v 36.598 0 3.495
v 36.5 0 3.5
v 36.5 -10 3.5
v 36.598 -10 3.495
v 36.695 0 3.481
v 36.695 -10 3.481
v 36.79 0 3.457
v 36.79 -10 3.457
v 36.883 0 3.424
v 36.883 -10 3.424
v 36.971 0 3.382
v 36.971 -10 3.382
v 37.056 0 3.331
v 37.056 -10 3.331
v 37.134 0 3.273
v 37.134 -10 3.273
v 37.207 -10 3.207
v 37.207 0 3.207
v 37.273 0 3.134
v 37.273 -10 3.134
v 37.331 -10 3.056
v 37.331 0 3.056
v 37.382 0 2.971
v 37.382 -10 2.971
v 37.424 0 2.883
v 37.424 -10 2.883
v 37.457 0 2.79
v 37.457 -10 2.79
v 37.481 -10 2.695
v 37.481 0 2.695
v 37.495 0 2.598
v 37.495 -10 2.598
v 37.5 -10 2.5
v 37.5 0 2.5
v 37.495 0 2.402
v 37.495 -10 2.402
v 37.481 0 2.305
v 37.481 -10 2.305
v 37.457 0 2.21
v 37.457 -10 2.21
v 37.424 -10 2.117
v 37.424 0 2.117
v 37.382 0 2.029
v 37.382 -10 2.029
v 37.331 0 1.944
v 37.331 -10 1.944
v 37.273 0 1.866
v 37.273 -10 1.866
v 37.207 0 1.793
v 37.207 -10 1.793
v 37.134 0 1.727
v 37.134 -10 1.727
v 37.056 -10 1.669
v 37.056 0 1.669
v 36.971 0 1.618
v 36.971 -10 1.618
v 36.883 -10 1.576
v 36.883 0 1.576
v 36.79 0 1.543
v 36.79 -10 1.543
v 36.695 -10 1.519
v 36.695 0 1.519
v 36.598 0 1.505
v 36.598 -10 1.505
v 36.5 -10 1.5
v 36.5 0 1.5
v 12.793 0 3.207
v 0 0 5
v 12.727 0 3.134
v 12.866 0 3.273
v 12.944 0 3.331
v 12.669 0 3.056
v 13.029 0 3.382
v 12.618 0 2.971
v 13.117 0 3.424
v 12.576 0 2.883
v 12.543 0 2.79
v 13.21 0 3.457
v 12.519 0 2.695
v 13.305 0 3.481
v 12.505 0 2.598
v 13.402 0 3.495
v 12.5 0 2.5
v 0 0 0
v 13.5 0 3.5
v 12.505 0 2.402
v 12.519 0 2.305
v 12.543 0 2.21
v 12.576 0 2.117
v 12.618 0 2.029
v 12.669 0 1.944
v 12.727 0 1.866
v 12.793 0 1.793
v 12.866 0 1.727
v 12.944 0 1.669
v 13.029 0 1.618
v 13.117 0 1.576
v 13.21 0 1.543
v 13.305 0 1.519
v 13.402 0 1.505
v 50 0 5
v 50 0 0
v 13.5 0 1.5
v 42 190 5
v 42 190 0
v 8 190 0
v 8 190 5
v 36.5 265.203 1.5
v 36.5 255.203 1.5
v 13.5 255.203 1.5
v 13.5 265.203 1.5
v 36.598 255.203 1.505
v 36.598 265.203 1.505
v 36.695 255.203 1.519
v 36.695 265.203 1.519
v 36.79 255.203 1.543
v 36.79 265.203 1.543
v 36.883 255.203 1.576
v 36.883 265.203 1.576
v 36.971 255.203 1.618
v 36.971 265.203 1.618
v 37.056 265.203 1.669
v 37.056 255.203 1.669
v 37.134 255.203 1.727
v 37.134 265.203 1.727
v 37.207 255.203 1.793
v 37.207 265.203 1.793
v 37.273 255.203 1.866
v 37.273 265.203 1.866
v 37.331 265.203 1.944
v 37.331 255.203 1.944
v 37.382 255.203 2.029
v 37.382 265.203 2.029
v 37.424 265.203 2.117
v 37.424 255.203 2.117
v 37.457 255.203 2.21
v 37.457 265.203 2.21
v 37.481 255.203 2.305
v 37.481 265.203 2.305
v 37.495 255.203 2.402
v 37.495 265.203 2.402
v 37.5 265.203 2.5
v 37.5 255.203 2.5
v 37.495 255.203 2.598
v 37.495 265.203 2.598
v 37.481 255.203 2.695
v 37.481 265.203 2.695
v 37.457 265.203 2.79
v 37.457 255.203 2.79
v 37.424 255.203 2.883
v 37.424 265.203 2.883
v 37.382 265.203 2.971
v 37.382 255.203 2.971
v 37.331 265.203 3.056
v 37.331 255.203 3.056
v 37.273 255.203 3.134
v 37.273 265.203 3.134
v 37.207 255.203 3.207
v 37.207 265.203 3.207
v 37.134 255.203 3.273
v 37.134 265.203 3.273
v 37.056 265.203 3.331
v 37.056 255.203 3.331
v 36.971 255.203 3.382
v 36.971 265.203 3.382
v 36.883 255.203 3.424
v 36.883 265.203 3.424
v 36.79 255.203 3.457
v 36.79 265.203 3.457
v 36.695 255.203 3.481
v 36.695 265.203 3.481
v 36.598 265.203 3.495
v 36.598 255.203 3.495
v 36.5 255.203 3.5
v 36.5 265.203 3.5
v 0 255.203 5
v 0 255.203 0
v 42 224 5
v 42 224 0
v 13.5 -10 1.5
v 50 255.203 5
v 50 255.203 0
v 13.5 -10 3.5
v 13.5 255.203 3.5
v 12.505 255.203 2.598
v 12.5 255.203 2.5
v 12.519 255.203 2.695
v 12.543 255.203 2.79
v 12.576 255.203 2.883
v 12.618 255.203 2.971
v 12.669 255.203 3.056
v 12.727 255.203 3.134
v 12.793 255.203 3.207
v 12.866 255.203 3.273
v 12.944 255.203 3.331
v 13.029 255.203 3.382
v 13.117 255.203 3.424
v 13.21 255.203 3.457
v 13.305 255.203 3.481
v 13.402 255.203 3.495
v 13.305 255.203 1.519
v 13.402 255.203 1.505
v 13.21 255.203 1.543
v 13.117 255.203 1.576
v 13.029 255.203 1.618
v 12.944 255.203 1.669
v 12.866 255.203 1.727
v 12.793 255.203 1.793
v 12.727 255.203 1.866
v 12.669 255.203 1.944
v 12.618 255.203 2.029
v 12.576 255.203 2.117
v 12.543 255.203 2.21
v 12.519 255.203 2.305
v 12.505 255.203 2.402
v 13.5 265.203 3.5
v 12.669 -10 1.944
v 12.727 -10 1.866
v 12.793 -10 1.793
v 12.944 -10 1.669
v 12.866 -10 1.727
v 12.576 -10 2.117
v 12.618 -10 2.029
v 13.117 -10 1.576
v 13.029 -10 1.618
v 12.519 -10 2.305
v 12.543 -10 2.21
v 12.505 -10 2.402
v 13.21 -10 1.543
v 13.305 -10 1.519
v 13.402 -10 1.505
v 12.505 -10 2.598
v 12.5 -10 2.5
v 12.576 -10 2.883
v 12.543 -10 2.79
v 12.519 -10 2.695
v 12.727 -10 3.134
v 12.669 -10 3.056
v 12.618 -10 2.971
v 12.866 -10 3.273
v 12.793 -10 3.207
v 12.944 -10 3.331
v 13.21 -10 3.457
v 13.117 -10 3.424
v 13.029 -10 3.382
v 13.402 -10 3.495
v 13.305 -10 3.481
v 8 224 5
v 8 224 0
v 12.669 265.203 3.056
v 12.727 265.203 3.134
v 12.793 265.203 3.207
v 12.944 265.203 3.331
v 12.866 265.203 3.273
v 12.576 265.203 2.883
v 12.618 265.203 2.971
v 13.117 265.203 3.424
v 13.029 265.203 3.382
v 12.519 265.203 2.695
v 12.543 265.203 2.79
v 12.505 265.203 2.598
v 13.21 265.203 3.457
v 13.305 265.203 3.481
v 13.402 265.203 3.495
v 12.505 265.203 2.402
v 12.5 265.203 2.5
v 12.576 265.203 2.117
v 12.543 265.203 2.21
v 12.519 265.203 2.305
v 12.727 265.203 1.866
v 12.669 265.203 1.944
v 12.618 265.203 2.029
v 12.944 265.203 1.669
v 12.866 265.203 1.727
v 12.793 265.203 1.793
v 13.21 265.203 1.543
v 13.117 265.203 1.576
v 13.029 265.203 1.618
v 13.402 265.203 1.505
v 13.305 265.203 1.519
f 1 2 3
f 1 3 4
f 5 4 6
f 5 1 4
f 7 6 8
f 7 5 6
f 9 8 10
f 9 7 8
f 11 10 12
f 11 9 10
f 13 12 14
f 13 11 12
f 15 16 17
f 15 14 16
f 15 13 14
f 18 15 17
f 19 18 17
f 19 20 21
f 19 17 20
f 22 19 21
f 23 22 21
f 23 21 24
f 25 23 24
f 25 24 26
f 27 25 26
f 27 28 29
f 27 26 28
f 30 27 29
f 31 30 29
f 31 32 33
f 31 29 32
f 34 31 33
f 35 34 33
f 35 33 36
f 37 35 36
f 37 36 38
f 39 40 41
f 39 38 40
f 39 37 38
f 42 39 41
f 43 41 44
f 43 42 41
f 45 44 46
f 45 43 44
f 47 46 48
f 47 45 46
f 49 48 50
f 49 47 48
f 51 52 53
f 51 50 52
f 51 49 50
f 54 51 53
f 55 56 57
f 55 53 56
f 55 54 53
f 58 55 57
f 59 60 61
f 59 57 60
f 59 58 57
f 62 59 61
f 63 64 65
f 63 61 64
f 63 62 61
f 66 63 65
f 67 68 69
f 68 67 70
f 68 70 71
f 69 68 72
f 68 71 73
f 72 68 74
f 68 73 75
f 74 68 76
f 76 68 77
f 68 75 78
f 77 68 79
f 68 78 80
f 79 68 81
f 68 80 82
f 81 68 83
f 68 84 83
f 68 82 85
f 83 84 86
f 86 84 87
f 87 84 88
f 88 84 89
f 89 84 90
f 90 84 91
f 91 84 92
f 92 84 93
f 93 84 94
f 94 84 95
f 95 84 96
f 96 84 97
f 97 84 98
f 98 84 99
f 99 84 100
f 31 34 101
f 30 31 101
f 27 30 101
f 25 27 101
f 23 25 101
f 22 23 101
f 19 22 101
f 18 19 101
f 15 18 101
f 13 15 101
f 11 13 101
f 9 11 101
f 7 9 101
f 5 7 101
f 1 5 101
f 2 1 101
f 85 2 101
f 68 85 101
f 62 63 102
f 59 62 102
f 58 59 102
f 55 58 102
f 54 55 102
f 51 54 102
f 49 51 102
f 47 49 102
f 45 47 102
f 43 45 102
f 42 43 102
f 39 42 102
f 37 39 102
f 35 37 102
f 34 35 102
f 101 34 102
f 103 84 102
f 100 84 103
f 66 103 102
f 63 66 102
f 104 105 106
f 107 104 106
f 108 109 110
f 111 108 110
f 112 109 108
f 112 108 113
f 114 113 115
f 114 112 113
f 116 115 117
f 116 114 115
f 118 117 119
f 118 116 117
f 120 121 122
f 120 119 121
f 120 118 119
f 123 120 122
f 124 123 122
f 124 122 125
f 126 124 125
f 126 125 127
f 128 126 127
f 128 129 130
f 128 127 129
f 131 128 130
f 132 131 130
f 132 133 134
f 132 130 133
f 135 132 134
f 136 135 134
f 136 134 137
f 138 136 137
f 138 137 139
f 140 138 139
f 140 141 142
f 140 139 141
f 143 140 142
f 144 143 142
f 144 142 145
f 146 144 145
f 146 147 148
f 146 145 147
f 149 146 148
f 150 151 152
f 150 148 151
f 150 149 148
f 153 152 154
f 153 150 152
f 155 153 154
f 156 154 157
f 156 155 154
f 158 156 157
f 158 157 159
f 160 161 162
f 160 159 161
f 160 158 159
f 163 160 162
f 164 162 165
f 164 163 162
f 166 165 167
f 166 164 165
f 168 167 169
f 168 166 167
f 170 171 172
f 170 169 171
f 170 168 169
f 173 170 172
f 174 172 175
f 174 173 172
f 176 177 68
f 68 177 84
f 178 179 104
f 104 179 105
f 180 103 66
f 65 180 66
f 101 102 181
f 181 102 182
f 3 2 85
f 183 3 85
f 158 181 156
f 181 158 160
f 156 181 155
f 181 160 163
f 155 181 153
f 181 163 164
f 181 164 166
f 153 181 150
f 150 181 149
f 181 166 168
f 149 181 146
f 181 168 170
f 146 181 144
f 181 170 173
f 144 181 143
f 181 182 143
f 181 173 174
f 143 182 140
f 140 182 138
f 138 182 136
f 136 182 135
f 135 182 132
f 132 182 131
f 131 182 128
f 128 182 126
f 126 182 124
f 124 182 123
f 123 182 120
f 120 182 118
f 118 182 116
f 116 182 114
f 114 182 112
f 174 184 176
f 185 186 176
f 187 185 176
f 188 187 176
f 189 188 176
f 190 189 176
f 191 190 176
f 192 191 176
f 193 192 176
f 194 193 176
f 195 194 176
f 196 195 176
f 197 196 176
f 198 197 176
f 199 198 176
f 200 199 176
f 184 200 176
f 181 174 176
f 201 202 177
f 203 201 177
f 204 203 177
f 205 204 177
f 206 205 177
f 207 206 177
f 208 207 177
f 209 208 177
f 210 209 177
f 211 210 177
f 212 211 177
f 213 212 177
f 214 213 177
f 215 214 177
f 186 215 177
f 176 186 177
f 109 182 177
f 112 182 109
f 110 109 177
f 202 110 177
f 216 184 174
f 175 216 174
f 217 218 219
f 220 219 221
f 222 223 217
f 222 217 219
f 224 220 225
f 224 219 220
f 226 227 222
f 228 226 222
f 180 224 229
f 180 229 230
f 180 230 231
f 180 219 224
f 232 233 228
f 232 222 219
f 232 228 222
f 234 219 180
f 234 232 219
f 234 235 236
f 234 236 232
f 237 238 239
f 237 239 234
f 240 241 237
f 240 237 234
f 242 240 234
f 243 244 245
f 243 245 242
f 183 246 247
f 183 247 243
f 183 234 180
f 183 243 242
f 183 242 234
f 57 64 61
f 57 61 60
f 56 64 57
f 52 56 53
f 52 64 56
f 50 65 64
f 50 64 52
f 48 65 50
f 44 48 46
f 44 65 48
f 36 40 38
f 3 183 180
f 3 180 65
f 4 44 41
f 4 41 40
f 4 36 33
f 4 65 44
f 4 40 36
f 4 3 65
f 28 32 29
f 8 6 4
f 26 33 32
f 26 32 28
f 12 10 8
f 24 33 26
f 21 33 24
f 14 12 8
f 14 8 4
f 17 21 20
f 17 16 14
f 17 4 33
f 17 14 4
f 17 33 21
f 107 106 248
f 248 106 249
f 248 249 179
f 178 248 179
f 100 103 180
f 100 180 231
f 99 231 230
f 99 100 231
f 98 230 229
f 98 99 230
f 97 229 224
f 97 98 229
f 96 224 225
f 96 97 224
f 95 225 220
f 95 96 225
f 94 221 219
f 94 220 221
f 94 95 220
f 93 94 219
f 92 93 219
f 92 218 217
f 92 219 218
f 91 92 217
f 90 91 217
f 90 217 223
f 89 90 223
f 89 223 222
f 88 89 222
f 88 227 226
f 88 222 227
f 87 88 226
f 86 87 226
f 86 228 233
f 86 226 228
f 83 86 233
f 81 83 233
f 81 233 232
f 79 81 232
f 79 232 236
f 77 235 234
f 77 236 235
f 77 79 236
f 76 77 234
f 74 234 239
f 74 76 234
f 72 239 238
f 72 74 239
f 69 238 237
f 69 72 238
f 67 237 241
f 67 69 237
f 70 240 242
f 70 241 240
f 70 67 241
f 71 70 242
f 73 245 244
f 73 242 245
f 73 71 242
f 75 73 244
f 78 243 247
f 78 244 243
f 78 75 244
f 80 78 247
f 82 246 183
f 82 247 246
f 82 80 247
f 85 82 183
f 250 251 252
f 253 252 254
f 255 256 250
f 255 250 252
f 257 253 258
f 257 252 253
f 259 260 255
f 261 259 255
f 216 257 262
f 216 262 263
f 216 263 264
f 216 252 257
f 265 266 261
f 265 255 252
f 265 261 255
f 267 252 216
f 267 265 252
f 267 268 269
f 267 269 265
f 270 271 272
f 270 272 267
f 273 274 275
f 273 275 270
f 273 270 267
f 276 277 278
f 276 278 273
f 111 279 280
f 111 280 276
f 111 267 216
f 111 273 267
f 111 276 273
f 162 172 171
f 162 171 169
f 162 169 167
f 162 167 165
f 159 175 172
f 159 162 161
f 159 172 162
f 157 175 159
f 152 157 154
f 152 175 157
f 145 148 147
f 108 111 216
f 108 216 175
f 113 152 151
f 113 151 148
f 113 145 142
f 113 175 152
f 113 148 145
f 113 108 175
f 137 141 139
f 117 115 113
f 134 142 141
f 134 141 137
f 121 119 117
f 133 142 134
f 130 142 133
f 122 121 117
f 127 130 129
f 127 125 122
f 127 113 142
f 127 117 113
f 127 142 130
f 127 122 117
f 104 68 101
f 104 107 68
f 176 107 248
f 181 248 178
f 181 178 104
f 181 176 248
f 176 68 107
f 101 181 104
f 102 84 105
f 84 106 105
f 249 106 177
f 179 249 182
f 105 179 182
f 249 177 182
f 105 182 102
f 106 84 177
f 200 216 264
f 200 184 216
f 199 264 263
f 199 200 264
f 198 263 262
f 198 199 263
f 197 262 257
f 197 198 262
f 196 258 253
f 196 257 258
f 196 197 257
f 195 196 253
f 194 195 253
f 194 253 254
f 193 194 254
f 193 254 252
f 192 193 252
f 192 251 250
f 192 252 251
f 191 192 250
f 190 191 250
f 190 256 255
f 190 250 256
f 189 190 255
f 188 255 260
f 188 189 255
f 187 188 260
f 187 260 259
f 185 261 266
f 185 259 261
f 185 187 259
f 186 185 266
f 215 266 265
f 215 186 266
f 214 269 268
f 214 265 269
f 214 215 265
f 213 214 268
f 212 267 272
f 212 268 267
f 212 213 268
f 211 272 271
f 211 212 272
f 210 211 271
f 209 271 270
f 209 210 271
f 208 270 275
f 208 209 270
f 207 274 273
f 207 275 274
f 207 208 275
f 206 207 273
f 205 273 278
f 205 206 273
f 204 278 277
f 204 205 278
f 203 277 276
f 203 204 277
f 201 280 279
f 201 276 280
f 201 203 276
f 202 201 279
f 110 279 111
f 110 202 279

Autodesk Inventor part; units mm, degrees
ref_plane "YZ Plane" through (0, 0, 0) normal (1, 0, 0) x (0, 1, 0)
ref_plane "XZ Plane" through (0, 0, 0) normal (0, 1, 0) x (-1, 0, 0)
ref_plane "XY Plane" through (0, 0, 0) normal (0, 0, 1) x (1, 0, 0)
sketch "Sketch1" plane through (0, 0, 0) normal (0, 0, 1) x (1, 0, 0)
  line L0 (0, 0) -> (50, 0)
  line L1 (50, 0) -> (50, 255.203)
  line L2 (50, 255.203) -> (0, 255.203)
  line L3 (0, 255.203) -> (0, 0)
  line L4 (8, 224) -> (42, 224)
  line L5 (42, 224) -> (42, 190)
  line L6 (42, 190) -> (8, 190)
  line L7 (8, 190) -> (8, 224)
  point P0 (25, 255.203)
  dimension "d0" = 50
  dimension "d1" = 255.203
  dimension "d8" = 34
  dimension "d9" = 34
  dimension "d10" = 8
  dimension "d12" = 190
extrude "Extrusion1" add sketch "Sketch1" along normal blind 5
sketch "Sketch2" plane through (0, 0, 0) normal (0, -1, 0) x (1, 0, 0)
  line L0 (13.5, 2.5) -> (36.5, 2.5) construction
  line L1 (13.5, 1.5) -> (36.5, 1.5)
  line L2 (36.5, 3.5) -> (13.5, 3.5)
  arc A0 (13.5, 3.5) -> (13.5, 1.5) centre (13.5, 2.5) ccw
  arc A1 (36.5, 1.5) -> (36.5, 3.5) centre (36.5, 2.5) ccw
  line L3 (0, 5) -> (50, 5) projected
  point P0 (0, 0)
  point P1 (25, 2.5)
  point P2 (37.5, 2.5)
  point P3 (12.5, 2.5)
  dimension "d13" = 2
  dimension "d21" = 25
  dimension "d22" = 25
  dimension "d23" = 2.5
extrude "Extrusion2" add sketch "Sketch2" along normal blind 10
sketch "Sketch4" plane through (0, 255.203, 0) normal (0, 1, 0) x (1, 0, 0)
  line L0 (36.5, -2.5) -> (13.5, -2.5) construction
  line L1 (36.5, -1.5) -> (13.5, -1.5)
  line L2 (13.5, -3.5) -> (36.5, -3.5)
  arc A0 (36.5, -3.5) -> (36.5, -1.5) centre (36.5, -2.5) ccw
  arc A1 (13.5, -1.5) -> (13.5, -3.5) centre (13.5, -2.5) ccw
  point P0 (0, 0)
  point P1 (25, -2.5)
  point P2 (12.5, -2.5)
  point P3 (37.5, -2.5)
  dimension "d24" = 2
  dimension "d26" = 25
  dimension "d28" = 2.5
  dimension "d29" = 25
extrude "Extrusion3" add sketch "Sketch4" along normal blind 10
properties part number "partttt"
